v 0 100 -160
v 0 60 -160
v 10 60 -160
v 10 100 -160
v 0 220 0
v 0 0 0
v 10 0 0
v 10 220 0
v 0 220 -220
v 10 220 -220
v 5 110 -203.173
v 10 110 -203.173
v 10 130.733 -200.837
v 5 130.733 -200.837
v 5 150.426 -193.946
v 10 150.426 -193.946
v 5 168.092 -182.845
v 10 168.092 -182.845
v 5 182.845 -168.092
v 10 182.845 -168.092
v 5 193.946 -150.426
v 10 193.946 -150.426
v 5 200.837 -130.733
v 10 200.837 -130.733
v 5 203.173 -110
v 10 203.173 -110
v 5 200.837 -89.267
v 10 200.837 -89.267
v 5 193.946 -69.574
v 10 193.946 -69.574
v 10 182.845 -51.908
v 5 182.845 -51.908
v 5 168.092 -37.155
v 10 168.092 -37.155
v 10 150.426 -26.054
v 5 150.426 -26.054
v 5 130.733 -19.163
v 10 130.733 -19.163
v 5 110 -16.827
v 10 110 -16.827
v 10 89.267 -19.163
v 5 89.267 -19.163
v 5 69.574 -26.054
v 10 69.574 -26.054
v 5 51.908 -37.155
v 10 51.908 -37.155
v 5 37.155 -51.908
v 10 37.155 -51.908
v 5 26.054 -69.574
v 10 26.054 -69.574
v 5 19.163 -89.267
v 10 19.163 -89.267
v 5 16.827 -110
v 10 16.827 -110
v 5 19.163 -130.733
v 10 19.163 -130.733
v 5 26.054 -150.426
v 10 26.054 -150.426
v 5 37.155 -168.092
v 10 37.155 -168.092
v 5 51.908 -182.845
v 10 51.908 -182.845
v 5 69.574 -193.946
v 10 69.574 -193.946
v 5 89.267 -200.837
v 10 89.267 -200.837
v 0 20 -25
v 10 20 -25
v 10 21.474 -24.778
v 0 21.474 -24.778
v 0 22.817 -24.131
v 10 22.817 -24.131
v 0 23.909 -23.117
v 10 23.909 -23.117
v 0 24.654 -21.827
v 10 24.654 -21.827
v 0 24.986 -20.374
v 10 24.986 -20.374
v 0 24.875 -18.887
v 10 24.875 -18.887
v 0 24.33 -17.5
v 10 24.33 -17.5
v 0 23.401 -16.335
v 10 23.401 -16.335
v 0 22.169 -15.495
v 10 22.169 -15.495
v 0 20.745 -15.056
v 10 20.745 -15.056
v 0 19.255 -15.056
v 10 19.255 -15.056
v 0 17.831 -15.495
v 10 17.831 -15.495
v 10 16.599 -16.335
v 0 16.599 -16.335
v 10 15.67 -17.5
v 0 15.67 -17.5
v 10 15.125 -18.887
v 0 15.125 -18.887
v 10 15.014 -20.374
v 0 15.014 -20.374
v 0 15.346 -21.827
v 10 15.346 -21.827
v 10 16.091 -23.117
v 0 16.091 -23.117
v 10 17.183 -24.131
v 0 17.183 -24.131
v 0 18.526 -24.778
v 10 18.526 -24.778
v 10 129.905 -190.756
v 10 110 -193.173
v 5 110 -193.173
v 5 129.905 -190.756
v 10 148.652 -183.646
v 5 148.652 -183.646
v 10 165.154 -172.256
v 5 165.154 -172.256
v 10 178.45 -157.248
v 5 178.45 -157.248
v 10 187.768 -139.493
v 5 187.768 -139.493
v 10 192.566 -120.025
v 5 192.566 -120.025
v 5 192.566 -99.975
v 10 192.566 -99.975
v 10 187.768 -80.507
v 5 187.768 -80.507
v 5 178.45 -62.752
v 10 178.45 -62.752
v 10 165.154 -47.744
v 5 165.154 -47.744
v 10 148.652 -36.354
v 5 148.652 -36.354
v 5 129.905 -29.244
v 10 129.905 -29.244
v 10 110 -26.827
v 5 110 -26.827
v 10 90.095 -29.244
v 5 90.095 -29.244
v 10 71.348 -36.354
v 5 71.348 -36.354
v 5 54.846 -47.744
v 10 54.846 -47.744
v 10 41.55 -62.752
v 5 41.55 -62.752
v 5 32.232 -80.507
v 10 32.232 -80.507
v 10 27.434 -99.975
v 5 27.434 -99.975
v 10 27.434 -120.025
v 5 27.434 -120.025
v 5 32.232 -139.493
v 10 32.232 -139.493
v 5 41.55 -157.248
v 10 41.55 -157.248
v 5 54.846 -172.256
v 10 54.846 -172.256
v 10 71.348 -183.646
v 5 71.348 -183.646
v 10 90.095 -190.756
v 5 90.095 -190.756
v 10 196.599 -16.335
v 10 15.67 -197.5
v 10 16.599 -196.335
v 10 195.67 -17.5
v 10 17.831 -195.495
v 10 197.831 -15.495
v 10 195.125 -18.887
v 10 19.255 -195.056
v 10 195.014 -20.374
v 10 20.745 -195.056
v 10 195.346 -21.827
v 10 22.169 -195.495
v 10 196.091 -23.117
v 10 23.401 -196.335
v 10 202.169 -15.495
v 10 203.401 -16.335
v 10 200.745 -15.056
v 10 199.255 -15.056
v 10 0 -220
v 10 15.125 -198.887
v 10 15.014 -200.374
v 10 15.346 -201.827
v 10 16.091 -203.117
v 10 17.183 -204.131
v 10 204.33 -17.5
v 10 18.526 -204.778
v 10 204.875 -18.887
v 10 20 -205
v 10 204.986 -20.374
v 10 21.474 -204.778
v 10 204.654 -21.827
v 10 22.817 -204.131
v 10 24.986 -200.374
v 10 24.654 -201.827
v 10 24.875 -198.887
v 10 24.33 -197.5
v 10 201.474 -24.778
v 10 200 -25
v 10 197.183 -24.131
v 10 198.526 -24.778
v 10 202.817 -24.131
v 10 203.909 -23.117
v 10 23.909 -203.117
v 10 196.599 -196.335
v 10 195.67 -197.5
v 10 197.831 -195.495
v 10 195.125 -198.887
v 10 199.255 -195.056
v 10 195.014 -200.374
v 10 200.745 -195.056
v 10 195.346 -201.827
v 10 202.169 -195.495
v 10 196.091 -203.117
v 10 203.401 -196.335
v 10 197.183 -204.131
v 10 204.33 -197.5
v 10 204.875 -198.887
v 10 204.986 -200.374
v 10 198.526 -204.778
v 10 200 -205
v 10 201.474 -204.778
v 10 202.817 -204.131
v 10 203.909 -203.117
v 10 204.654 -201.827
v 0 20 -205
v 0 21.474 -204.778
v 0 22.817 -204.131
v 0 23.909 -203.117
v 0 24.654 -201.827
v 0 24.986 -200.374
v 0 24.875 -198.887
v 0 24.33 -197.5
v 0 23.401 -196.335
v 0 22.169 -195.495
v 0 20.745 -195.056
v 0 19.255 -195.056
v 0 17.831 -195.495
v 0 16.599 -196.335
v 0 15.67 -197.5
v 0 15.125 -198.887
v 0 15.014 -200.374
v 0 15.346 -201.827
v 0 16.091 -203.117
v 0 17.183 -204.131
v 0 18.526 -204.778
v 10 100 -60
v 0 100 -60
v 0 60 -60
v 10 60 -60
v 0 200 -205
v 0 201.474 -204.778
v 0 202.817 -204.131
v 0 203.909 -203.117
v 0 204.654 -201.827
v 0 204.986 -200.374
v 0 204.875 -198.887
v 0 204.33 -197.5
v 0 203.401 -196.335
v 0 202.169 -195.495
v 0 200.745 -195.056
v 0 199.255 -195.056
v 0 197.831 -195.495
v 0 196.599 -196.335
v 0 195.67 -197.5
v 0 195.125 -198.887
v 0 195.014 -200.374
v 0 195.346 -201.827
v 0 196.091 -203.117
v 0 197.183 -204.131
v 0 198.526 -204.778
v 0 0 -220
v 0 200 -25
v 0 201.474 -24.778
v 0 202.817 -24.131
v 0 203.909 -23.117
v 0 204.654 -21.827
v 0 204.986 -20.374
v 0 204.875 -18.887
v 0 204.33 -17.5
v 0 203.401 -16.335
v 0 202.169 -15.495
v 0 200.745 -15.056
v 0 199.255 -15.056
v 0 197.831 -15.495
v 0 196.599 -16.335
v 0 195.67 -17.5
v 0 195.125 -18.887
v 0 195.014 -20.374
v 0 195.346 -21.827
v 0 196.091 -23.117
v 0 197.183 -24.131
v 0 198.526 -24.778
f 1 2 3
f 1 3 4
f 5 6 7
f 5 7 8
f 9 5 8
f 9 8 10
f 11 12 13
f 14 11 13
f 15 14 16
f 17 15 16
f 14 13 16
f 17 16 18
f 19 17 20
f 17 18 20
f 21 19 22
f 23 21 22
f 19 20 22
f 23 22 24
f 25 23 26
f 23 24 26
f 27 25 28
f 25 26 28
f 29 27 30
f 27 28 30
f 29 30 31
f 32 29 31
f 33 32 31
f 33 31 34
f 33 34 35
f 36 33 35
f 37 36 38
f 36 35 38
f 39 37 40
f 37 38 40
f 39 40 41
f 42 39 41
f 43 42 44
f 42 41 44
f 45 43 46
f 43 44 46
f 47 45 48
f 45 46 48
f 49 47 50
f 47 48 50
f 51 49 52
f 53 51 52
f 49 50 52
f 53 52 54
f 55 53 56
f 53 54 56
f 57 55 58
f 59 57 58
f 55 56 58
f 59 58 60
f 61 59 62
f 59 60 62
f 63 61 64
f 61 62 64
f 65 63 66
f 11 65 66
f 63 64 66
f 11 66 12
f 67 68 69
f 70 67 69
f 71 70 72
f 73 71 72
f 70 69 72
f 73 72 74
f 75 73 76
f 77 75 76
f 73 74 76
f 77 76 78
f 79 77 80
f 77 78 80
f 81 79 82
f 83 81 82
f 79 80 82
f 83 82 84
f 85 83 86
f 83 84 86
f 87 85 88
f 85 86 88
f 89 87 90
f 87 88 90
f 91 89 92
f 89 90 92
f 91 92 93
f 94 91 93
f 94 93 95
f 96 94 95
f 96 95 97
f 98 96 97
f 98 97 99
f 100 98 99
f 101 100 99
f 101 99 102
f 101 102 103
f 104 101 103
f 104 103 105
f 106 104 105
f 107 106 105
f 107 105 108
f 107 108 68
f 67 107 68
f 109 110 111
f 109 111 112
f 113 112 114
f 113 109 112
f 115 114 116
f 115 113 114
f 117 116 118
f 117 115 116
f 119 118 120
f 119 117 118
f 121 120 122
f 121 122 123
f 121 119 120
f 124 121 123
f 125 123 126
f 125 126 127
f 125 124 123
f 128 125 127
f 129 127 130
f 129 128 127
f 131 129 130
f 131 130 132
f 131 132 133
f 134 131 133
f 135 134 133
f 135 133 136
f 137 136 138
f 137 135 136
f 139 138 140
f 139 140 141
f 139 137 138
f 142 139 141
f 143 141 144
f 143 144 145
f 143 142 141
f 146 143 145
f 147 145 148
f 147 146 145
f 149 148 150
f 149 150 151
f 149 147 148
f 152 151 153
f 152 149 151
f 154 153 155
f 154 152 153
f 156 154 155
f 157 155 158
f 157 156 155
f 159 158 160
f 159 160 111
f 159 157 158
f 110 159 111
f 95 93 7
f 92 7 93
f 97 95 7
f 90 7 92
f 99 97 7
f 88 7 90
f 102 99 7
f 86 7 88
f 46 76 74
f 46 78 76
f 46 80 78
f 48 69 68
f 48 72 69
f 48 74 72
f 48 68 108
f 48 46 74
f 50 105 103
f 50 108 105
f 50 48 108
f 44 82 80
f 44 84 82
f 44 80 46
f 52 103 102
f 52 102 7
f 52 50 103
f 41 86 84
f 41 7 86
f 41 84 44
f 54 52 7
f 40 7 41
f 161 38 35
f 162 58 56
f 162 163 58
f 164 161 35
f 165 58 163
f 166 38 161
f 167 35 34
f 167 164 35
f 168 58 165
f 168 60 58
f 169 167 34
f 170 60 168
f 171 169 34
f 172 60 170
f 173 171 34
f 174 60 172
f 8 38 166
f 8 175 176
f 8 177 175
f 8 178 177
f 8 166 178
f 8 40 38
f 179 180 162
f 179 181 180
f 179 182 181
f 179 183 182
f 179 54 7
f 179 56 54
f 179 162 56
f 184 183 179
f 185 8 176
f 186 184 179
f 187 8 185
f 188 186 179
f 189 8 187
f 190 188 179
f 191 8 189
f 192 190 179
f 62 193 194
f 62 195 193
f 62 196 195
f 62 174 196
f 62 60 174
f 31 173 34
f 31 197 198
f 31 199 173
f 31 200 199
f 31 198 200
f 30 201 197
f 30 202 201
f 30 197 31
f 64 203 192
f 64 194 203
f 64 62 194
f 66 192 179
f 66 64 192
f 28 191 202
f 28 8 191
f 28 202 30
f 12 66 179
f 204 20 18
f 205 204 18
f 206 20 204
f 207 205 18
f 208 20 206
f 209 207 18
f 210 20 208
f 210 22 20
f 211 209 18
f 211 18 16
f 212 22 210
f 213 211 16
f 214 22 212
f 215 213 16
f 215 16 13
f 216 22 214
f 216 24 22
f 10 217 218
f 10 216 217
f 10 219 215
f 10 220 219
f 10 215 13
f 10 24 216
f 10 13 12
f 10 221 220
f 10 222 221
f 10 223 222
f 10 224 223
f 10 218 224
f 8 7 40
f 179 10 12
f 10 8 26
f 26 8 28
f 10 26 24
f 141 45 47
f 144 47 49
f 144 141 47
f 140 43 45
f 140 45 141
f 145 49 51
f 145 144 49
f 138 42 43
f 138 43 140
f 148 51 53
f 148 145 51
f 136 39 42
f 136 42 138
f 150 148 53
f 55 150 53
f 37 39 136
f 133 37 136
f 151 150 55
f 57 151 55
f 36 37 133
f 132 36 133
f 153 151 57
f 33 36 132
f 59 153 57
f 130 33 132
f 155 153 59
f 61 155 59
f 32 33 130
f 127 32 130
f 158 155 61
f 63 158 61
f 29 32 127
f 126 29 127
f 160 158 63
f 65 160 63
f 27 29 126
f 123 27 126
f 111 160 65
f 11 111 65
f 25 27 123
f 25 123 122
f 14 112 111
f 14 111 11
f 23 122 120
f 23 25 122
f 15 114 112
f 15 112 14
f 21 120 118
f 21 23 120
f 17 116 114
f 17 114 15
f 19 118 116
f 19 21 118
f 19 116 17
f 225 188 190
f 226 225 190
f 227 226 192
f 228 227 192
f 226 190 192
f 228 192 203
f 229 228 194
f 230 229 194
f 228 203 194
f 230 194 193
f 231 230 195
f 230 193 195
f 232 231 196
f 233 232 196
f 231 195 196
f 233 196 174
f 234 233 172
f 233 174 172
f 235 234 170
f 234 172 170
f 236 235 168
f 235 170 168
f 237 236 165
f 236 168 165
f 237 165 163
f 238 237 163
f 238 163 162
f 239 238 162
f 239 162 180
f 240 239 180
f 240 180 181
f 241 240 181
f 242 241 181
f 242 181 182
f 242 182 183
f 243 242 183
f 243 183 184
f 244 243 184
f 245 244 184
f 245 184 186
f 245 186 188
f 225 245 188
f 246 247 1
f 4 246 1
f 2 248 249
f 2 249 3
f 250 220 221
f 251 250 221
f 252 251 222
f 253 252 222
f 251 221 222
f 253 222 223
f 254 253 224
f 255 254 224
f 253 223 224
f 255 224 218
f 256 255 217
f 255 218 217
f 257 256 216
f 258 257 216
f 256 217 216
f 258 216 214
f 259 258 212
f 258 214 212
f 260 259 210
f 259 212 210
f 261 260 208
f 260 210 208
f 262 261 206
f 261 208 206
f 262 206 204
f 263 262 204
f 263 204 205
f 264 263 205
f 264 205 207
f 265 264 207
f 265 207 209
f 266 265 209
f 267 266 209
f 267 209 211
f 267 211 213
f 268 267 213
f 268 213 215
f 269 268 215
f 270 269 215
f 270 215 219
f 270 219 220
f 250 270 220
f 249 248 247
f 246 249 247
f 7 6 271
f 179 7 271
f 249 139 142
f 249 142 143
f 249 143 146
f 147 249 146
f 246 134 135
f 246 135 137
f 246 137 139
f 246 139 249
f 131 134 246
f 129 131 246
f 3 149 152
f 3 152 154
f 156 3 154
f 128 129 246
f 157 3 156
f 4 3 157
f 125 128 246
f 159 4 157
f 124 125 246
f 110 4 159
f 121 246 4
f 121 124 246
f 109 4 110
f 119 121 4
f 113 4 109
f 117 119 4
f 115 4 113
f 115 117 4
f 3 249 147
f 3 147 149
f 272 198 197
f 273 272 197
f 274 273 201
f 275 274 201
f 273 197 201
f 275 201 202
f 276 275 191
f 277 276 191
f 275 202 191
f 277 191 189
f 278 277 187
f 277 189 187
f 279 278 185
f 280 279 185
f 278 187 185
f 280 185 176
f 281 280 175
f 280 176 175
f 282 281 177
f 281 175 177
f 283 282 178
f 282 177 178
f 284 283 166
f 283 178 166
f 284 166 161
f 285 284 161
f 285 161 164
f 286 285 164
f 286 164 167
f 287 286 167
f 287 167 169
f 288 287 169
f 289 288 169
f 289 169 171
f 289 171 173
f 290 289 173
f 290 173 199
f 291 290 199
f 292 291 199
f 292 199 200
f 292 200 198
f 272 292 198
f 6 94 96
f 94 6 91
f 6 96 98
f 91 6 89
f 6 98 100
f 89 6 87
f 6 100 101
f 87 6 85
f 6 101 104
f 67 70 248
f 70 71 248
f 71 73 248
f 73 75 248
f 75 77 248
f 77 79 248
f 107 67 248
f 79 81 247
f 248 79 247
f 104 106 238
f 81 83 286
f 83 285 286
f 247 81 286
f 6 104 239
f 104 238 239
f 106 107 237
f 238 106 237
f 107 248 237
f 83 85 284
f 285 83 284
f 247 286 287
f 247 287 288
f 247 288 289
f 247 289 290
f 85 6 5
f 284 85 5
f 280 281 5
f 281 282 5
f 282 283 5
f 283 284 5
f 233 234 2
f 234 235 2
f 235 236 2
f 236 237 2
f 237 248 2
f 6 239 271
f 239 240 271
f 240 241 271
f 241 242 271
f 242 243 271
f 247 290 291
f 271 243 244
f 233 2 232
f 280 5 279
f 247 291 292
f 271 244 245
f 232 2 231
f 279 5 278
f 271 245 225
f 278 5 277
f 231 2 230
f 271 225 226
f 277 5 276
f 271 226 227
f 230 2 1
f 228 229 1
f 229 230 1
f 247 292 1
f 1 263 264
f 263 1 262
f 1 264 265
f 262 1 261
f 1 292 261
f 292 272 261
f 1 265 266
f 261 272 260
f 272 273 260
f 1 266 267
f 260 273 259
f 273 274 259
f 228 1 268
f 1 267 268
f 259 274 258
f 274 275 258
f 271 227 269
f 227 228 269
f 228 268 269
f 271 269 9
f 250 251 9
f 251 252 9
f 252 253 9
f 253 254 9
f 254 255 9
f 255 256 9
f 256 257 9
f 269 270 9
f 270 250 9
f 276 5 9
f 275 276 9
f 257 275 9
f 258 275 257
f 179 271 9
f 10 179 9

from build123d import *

# Parameters (mm, degrees)
SKETCH1_W           = 220
SKETCH1_H           = 220
SKETCH1_W_2         = 100
SKETCH1_H_2         = 40
BOSS_EXTRUDE1_DEPTH = 10
SKETCH2_R           = 93.17284
SKETCH2_R_2         = 83.17284
CUT_EXTRUDE1_DEPTH  = 5
SKETCH3_R           = 5
CUT_EXTRUDE2_DEPTH  = 11


with BuildPart() as part:
    # Sketch1 → Boss-Extrude1 (new body)
    with BuildSketch(Plane(origin=(0, 0, 0), x_dir=(0, 0, -1), z_dir=(1, 0, 0))):
        with Locations((110, 110)):
            Rectangle(SKETCH1_W, SKETCH1_H)
        with Locations((110, 80)):
            Rectangle(SKETCH1_W_2, SKETCH1_H_2, mode=Mode.SUBTRACT)
    extrude(amount=BOSS_EXTRUDE1_DEPTH)

    # Sketch2 → Cut-Extrude1 (cut)
    with BuildSketch(Plane(origin=(10, 0, 0), x_dir=(0, 0, -1), z_dir=(1, 0, 0))):
        with Locations((110, 110)):
            Circle(SKETCH2_R)
        with Locations((110, 110)):
            Circle(SKETCH2_R_2, mode=Mode.SUBTRACT)
    extrude(amount=-CUT_EXTRUDE1_DEPTH, mode=Mode.SUBTRACT)

    # Sketch3 → Cut-Extrude2 (cut, through all)
    with BuildSketch(Plane(origin=(10, 0, 0), x_dir=(0, 0, -1), z_dir=(1, 0, 0))):
        with Locations((20, 200)):
            Circle(SKETCH3_R)
        with Locations((200, 200)):
            Circle(SKETCH3_R)
        with Locations((200, 20)):
            Circle(SKETCH3_R)
        with Locations((20, 20)):
            Circle(SKETCH3_R)
    extrude(amount=-CUT_EXTRUDE2_DEPTH, mode=Mode.SUBTRACT)


solid = part.part
